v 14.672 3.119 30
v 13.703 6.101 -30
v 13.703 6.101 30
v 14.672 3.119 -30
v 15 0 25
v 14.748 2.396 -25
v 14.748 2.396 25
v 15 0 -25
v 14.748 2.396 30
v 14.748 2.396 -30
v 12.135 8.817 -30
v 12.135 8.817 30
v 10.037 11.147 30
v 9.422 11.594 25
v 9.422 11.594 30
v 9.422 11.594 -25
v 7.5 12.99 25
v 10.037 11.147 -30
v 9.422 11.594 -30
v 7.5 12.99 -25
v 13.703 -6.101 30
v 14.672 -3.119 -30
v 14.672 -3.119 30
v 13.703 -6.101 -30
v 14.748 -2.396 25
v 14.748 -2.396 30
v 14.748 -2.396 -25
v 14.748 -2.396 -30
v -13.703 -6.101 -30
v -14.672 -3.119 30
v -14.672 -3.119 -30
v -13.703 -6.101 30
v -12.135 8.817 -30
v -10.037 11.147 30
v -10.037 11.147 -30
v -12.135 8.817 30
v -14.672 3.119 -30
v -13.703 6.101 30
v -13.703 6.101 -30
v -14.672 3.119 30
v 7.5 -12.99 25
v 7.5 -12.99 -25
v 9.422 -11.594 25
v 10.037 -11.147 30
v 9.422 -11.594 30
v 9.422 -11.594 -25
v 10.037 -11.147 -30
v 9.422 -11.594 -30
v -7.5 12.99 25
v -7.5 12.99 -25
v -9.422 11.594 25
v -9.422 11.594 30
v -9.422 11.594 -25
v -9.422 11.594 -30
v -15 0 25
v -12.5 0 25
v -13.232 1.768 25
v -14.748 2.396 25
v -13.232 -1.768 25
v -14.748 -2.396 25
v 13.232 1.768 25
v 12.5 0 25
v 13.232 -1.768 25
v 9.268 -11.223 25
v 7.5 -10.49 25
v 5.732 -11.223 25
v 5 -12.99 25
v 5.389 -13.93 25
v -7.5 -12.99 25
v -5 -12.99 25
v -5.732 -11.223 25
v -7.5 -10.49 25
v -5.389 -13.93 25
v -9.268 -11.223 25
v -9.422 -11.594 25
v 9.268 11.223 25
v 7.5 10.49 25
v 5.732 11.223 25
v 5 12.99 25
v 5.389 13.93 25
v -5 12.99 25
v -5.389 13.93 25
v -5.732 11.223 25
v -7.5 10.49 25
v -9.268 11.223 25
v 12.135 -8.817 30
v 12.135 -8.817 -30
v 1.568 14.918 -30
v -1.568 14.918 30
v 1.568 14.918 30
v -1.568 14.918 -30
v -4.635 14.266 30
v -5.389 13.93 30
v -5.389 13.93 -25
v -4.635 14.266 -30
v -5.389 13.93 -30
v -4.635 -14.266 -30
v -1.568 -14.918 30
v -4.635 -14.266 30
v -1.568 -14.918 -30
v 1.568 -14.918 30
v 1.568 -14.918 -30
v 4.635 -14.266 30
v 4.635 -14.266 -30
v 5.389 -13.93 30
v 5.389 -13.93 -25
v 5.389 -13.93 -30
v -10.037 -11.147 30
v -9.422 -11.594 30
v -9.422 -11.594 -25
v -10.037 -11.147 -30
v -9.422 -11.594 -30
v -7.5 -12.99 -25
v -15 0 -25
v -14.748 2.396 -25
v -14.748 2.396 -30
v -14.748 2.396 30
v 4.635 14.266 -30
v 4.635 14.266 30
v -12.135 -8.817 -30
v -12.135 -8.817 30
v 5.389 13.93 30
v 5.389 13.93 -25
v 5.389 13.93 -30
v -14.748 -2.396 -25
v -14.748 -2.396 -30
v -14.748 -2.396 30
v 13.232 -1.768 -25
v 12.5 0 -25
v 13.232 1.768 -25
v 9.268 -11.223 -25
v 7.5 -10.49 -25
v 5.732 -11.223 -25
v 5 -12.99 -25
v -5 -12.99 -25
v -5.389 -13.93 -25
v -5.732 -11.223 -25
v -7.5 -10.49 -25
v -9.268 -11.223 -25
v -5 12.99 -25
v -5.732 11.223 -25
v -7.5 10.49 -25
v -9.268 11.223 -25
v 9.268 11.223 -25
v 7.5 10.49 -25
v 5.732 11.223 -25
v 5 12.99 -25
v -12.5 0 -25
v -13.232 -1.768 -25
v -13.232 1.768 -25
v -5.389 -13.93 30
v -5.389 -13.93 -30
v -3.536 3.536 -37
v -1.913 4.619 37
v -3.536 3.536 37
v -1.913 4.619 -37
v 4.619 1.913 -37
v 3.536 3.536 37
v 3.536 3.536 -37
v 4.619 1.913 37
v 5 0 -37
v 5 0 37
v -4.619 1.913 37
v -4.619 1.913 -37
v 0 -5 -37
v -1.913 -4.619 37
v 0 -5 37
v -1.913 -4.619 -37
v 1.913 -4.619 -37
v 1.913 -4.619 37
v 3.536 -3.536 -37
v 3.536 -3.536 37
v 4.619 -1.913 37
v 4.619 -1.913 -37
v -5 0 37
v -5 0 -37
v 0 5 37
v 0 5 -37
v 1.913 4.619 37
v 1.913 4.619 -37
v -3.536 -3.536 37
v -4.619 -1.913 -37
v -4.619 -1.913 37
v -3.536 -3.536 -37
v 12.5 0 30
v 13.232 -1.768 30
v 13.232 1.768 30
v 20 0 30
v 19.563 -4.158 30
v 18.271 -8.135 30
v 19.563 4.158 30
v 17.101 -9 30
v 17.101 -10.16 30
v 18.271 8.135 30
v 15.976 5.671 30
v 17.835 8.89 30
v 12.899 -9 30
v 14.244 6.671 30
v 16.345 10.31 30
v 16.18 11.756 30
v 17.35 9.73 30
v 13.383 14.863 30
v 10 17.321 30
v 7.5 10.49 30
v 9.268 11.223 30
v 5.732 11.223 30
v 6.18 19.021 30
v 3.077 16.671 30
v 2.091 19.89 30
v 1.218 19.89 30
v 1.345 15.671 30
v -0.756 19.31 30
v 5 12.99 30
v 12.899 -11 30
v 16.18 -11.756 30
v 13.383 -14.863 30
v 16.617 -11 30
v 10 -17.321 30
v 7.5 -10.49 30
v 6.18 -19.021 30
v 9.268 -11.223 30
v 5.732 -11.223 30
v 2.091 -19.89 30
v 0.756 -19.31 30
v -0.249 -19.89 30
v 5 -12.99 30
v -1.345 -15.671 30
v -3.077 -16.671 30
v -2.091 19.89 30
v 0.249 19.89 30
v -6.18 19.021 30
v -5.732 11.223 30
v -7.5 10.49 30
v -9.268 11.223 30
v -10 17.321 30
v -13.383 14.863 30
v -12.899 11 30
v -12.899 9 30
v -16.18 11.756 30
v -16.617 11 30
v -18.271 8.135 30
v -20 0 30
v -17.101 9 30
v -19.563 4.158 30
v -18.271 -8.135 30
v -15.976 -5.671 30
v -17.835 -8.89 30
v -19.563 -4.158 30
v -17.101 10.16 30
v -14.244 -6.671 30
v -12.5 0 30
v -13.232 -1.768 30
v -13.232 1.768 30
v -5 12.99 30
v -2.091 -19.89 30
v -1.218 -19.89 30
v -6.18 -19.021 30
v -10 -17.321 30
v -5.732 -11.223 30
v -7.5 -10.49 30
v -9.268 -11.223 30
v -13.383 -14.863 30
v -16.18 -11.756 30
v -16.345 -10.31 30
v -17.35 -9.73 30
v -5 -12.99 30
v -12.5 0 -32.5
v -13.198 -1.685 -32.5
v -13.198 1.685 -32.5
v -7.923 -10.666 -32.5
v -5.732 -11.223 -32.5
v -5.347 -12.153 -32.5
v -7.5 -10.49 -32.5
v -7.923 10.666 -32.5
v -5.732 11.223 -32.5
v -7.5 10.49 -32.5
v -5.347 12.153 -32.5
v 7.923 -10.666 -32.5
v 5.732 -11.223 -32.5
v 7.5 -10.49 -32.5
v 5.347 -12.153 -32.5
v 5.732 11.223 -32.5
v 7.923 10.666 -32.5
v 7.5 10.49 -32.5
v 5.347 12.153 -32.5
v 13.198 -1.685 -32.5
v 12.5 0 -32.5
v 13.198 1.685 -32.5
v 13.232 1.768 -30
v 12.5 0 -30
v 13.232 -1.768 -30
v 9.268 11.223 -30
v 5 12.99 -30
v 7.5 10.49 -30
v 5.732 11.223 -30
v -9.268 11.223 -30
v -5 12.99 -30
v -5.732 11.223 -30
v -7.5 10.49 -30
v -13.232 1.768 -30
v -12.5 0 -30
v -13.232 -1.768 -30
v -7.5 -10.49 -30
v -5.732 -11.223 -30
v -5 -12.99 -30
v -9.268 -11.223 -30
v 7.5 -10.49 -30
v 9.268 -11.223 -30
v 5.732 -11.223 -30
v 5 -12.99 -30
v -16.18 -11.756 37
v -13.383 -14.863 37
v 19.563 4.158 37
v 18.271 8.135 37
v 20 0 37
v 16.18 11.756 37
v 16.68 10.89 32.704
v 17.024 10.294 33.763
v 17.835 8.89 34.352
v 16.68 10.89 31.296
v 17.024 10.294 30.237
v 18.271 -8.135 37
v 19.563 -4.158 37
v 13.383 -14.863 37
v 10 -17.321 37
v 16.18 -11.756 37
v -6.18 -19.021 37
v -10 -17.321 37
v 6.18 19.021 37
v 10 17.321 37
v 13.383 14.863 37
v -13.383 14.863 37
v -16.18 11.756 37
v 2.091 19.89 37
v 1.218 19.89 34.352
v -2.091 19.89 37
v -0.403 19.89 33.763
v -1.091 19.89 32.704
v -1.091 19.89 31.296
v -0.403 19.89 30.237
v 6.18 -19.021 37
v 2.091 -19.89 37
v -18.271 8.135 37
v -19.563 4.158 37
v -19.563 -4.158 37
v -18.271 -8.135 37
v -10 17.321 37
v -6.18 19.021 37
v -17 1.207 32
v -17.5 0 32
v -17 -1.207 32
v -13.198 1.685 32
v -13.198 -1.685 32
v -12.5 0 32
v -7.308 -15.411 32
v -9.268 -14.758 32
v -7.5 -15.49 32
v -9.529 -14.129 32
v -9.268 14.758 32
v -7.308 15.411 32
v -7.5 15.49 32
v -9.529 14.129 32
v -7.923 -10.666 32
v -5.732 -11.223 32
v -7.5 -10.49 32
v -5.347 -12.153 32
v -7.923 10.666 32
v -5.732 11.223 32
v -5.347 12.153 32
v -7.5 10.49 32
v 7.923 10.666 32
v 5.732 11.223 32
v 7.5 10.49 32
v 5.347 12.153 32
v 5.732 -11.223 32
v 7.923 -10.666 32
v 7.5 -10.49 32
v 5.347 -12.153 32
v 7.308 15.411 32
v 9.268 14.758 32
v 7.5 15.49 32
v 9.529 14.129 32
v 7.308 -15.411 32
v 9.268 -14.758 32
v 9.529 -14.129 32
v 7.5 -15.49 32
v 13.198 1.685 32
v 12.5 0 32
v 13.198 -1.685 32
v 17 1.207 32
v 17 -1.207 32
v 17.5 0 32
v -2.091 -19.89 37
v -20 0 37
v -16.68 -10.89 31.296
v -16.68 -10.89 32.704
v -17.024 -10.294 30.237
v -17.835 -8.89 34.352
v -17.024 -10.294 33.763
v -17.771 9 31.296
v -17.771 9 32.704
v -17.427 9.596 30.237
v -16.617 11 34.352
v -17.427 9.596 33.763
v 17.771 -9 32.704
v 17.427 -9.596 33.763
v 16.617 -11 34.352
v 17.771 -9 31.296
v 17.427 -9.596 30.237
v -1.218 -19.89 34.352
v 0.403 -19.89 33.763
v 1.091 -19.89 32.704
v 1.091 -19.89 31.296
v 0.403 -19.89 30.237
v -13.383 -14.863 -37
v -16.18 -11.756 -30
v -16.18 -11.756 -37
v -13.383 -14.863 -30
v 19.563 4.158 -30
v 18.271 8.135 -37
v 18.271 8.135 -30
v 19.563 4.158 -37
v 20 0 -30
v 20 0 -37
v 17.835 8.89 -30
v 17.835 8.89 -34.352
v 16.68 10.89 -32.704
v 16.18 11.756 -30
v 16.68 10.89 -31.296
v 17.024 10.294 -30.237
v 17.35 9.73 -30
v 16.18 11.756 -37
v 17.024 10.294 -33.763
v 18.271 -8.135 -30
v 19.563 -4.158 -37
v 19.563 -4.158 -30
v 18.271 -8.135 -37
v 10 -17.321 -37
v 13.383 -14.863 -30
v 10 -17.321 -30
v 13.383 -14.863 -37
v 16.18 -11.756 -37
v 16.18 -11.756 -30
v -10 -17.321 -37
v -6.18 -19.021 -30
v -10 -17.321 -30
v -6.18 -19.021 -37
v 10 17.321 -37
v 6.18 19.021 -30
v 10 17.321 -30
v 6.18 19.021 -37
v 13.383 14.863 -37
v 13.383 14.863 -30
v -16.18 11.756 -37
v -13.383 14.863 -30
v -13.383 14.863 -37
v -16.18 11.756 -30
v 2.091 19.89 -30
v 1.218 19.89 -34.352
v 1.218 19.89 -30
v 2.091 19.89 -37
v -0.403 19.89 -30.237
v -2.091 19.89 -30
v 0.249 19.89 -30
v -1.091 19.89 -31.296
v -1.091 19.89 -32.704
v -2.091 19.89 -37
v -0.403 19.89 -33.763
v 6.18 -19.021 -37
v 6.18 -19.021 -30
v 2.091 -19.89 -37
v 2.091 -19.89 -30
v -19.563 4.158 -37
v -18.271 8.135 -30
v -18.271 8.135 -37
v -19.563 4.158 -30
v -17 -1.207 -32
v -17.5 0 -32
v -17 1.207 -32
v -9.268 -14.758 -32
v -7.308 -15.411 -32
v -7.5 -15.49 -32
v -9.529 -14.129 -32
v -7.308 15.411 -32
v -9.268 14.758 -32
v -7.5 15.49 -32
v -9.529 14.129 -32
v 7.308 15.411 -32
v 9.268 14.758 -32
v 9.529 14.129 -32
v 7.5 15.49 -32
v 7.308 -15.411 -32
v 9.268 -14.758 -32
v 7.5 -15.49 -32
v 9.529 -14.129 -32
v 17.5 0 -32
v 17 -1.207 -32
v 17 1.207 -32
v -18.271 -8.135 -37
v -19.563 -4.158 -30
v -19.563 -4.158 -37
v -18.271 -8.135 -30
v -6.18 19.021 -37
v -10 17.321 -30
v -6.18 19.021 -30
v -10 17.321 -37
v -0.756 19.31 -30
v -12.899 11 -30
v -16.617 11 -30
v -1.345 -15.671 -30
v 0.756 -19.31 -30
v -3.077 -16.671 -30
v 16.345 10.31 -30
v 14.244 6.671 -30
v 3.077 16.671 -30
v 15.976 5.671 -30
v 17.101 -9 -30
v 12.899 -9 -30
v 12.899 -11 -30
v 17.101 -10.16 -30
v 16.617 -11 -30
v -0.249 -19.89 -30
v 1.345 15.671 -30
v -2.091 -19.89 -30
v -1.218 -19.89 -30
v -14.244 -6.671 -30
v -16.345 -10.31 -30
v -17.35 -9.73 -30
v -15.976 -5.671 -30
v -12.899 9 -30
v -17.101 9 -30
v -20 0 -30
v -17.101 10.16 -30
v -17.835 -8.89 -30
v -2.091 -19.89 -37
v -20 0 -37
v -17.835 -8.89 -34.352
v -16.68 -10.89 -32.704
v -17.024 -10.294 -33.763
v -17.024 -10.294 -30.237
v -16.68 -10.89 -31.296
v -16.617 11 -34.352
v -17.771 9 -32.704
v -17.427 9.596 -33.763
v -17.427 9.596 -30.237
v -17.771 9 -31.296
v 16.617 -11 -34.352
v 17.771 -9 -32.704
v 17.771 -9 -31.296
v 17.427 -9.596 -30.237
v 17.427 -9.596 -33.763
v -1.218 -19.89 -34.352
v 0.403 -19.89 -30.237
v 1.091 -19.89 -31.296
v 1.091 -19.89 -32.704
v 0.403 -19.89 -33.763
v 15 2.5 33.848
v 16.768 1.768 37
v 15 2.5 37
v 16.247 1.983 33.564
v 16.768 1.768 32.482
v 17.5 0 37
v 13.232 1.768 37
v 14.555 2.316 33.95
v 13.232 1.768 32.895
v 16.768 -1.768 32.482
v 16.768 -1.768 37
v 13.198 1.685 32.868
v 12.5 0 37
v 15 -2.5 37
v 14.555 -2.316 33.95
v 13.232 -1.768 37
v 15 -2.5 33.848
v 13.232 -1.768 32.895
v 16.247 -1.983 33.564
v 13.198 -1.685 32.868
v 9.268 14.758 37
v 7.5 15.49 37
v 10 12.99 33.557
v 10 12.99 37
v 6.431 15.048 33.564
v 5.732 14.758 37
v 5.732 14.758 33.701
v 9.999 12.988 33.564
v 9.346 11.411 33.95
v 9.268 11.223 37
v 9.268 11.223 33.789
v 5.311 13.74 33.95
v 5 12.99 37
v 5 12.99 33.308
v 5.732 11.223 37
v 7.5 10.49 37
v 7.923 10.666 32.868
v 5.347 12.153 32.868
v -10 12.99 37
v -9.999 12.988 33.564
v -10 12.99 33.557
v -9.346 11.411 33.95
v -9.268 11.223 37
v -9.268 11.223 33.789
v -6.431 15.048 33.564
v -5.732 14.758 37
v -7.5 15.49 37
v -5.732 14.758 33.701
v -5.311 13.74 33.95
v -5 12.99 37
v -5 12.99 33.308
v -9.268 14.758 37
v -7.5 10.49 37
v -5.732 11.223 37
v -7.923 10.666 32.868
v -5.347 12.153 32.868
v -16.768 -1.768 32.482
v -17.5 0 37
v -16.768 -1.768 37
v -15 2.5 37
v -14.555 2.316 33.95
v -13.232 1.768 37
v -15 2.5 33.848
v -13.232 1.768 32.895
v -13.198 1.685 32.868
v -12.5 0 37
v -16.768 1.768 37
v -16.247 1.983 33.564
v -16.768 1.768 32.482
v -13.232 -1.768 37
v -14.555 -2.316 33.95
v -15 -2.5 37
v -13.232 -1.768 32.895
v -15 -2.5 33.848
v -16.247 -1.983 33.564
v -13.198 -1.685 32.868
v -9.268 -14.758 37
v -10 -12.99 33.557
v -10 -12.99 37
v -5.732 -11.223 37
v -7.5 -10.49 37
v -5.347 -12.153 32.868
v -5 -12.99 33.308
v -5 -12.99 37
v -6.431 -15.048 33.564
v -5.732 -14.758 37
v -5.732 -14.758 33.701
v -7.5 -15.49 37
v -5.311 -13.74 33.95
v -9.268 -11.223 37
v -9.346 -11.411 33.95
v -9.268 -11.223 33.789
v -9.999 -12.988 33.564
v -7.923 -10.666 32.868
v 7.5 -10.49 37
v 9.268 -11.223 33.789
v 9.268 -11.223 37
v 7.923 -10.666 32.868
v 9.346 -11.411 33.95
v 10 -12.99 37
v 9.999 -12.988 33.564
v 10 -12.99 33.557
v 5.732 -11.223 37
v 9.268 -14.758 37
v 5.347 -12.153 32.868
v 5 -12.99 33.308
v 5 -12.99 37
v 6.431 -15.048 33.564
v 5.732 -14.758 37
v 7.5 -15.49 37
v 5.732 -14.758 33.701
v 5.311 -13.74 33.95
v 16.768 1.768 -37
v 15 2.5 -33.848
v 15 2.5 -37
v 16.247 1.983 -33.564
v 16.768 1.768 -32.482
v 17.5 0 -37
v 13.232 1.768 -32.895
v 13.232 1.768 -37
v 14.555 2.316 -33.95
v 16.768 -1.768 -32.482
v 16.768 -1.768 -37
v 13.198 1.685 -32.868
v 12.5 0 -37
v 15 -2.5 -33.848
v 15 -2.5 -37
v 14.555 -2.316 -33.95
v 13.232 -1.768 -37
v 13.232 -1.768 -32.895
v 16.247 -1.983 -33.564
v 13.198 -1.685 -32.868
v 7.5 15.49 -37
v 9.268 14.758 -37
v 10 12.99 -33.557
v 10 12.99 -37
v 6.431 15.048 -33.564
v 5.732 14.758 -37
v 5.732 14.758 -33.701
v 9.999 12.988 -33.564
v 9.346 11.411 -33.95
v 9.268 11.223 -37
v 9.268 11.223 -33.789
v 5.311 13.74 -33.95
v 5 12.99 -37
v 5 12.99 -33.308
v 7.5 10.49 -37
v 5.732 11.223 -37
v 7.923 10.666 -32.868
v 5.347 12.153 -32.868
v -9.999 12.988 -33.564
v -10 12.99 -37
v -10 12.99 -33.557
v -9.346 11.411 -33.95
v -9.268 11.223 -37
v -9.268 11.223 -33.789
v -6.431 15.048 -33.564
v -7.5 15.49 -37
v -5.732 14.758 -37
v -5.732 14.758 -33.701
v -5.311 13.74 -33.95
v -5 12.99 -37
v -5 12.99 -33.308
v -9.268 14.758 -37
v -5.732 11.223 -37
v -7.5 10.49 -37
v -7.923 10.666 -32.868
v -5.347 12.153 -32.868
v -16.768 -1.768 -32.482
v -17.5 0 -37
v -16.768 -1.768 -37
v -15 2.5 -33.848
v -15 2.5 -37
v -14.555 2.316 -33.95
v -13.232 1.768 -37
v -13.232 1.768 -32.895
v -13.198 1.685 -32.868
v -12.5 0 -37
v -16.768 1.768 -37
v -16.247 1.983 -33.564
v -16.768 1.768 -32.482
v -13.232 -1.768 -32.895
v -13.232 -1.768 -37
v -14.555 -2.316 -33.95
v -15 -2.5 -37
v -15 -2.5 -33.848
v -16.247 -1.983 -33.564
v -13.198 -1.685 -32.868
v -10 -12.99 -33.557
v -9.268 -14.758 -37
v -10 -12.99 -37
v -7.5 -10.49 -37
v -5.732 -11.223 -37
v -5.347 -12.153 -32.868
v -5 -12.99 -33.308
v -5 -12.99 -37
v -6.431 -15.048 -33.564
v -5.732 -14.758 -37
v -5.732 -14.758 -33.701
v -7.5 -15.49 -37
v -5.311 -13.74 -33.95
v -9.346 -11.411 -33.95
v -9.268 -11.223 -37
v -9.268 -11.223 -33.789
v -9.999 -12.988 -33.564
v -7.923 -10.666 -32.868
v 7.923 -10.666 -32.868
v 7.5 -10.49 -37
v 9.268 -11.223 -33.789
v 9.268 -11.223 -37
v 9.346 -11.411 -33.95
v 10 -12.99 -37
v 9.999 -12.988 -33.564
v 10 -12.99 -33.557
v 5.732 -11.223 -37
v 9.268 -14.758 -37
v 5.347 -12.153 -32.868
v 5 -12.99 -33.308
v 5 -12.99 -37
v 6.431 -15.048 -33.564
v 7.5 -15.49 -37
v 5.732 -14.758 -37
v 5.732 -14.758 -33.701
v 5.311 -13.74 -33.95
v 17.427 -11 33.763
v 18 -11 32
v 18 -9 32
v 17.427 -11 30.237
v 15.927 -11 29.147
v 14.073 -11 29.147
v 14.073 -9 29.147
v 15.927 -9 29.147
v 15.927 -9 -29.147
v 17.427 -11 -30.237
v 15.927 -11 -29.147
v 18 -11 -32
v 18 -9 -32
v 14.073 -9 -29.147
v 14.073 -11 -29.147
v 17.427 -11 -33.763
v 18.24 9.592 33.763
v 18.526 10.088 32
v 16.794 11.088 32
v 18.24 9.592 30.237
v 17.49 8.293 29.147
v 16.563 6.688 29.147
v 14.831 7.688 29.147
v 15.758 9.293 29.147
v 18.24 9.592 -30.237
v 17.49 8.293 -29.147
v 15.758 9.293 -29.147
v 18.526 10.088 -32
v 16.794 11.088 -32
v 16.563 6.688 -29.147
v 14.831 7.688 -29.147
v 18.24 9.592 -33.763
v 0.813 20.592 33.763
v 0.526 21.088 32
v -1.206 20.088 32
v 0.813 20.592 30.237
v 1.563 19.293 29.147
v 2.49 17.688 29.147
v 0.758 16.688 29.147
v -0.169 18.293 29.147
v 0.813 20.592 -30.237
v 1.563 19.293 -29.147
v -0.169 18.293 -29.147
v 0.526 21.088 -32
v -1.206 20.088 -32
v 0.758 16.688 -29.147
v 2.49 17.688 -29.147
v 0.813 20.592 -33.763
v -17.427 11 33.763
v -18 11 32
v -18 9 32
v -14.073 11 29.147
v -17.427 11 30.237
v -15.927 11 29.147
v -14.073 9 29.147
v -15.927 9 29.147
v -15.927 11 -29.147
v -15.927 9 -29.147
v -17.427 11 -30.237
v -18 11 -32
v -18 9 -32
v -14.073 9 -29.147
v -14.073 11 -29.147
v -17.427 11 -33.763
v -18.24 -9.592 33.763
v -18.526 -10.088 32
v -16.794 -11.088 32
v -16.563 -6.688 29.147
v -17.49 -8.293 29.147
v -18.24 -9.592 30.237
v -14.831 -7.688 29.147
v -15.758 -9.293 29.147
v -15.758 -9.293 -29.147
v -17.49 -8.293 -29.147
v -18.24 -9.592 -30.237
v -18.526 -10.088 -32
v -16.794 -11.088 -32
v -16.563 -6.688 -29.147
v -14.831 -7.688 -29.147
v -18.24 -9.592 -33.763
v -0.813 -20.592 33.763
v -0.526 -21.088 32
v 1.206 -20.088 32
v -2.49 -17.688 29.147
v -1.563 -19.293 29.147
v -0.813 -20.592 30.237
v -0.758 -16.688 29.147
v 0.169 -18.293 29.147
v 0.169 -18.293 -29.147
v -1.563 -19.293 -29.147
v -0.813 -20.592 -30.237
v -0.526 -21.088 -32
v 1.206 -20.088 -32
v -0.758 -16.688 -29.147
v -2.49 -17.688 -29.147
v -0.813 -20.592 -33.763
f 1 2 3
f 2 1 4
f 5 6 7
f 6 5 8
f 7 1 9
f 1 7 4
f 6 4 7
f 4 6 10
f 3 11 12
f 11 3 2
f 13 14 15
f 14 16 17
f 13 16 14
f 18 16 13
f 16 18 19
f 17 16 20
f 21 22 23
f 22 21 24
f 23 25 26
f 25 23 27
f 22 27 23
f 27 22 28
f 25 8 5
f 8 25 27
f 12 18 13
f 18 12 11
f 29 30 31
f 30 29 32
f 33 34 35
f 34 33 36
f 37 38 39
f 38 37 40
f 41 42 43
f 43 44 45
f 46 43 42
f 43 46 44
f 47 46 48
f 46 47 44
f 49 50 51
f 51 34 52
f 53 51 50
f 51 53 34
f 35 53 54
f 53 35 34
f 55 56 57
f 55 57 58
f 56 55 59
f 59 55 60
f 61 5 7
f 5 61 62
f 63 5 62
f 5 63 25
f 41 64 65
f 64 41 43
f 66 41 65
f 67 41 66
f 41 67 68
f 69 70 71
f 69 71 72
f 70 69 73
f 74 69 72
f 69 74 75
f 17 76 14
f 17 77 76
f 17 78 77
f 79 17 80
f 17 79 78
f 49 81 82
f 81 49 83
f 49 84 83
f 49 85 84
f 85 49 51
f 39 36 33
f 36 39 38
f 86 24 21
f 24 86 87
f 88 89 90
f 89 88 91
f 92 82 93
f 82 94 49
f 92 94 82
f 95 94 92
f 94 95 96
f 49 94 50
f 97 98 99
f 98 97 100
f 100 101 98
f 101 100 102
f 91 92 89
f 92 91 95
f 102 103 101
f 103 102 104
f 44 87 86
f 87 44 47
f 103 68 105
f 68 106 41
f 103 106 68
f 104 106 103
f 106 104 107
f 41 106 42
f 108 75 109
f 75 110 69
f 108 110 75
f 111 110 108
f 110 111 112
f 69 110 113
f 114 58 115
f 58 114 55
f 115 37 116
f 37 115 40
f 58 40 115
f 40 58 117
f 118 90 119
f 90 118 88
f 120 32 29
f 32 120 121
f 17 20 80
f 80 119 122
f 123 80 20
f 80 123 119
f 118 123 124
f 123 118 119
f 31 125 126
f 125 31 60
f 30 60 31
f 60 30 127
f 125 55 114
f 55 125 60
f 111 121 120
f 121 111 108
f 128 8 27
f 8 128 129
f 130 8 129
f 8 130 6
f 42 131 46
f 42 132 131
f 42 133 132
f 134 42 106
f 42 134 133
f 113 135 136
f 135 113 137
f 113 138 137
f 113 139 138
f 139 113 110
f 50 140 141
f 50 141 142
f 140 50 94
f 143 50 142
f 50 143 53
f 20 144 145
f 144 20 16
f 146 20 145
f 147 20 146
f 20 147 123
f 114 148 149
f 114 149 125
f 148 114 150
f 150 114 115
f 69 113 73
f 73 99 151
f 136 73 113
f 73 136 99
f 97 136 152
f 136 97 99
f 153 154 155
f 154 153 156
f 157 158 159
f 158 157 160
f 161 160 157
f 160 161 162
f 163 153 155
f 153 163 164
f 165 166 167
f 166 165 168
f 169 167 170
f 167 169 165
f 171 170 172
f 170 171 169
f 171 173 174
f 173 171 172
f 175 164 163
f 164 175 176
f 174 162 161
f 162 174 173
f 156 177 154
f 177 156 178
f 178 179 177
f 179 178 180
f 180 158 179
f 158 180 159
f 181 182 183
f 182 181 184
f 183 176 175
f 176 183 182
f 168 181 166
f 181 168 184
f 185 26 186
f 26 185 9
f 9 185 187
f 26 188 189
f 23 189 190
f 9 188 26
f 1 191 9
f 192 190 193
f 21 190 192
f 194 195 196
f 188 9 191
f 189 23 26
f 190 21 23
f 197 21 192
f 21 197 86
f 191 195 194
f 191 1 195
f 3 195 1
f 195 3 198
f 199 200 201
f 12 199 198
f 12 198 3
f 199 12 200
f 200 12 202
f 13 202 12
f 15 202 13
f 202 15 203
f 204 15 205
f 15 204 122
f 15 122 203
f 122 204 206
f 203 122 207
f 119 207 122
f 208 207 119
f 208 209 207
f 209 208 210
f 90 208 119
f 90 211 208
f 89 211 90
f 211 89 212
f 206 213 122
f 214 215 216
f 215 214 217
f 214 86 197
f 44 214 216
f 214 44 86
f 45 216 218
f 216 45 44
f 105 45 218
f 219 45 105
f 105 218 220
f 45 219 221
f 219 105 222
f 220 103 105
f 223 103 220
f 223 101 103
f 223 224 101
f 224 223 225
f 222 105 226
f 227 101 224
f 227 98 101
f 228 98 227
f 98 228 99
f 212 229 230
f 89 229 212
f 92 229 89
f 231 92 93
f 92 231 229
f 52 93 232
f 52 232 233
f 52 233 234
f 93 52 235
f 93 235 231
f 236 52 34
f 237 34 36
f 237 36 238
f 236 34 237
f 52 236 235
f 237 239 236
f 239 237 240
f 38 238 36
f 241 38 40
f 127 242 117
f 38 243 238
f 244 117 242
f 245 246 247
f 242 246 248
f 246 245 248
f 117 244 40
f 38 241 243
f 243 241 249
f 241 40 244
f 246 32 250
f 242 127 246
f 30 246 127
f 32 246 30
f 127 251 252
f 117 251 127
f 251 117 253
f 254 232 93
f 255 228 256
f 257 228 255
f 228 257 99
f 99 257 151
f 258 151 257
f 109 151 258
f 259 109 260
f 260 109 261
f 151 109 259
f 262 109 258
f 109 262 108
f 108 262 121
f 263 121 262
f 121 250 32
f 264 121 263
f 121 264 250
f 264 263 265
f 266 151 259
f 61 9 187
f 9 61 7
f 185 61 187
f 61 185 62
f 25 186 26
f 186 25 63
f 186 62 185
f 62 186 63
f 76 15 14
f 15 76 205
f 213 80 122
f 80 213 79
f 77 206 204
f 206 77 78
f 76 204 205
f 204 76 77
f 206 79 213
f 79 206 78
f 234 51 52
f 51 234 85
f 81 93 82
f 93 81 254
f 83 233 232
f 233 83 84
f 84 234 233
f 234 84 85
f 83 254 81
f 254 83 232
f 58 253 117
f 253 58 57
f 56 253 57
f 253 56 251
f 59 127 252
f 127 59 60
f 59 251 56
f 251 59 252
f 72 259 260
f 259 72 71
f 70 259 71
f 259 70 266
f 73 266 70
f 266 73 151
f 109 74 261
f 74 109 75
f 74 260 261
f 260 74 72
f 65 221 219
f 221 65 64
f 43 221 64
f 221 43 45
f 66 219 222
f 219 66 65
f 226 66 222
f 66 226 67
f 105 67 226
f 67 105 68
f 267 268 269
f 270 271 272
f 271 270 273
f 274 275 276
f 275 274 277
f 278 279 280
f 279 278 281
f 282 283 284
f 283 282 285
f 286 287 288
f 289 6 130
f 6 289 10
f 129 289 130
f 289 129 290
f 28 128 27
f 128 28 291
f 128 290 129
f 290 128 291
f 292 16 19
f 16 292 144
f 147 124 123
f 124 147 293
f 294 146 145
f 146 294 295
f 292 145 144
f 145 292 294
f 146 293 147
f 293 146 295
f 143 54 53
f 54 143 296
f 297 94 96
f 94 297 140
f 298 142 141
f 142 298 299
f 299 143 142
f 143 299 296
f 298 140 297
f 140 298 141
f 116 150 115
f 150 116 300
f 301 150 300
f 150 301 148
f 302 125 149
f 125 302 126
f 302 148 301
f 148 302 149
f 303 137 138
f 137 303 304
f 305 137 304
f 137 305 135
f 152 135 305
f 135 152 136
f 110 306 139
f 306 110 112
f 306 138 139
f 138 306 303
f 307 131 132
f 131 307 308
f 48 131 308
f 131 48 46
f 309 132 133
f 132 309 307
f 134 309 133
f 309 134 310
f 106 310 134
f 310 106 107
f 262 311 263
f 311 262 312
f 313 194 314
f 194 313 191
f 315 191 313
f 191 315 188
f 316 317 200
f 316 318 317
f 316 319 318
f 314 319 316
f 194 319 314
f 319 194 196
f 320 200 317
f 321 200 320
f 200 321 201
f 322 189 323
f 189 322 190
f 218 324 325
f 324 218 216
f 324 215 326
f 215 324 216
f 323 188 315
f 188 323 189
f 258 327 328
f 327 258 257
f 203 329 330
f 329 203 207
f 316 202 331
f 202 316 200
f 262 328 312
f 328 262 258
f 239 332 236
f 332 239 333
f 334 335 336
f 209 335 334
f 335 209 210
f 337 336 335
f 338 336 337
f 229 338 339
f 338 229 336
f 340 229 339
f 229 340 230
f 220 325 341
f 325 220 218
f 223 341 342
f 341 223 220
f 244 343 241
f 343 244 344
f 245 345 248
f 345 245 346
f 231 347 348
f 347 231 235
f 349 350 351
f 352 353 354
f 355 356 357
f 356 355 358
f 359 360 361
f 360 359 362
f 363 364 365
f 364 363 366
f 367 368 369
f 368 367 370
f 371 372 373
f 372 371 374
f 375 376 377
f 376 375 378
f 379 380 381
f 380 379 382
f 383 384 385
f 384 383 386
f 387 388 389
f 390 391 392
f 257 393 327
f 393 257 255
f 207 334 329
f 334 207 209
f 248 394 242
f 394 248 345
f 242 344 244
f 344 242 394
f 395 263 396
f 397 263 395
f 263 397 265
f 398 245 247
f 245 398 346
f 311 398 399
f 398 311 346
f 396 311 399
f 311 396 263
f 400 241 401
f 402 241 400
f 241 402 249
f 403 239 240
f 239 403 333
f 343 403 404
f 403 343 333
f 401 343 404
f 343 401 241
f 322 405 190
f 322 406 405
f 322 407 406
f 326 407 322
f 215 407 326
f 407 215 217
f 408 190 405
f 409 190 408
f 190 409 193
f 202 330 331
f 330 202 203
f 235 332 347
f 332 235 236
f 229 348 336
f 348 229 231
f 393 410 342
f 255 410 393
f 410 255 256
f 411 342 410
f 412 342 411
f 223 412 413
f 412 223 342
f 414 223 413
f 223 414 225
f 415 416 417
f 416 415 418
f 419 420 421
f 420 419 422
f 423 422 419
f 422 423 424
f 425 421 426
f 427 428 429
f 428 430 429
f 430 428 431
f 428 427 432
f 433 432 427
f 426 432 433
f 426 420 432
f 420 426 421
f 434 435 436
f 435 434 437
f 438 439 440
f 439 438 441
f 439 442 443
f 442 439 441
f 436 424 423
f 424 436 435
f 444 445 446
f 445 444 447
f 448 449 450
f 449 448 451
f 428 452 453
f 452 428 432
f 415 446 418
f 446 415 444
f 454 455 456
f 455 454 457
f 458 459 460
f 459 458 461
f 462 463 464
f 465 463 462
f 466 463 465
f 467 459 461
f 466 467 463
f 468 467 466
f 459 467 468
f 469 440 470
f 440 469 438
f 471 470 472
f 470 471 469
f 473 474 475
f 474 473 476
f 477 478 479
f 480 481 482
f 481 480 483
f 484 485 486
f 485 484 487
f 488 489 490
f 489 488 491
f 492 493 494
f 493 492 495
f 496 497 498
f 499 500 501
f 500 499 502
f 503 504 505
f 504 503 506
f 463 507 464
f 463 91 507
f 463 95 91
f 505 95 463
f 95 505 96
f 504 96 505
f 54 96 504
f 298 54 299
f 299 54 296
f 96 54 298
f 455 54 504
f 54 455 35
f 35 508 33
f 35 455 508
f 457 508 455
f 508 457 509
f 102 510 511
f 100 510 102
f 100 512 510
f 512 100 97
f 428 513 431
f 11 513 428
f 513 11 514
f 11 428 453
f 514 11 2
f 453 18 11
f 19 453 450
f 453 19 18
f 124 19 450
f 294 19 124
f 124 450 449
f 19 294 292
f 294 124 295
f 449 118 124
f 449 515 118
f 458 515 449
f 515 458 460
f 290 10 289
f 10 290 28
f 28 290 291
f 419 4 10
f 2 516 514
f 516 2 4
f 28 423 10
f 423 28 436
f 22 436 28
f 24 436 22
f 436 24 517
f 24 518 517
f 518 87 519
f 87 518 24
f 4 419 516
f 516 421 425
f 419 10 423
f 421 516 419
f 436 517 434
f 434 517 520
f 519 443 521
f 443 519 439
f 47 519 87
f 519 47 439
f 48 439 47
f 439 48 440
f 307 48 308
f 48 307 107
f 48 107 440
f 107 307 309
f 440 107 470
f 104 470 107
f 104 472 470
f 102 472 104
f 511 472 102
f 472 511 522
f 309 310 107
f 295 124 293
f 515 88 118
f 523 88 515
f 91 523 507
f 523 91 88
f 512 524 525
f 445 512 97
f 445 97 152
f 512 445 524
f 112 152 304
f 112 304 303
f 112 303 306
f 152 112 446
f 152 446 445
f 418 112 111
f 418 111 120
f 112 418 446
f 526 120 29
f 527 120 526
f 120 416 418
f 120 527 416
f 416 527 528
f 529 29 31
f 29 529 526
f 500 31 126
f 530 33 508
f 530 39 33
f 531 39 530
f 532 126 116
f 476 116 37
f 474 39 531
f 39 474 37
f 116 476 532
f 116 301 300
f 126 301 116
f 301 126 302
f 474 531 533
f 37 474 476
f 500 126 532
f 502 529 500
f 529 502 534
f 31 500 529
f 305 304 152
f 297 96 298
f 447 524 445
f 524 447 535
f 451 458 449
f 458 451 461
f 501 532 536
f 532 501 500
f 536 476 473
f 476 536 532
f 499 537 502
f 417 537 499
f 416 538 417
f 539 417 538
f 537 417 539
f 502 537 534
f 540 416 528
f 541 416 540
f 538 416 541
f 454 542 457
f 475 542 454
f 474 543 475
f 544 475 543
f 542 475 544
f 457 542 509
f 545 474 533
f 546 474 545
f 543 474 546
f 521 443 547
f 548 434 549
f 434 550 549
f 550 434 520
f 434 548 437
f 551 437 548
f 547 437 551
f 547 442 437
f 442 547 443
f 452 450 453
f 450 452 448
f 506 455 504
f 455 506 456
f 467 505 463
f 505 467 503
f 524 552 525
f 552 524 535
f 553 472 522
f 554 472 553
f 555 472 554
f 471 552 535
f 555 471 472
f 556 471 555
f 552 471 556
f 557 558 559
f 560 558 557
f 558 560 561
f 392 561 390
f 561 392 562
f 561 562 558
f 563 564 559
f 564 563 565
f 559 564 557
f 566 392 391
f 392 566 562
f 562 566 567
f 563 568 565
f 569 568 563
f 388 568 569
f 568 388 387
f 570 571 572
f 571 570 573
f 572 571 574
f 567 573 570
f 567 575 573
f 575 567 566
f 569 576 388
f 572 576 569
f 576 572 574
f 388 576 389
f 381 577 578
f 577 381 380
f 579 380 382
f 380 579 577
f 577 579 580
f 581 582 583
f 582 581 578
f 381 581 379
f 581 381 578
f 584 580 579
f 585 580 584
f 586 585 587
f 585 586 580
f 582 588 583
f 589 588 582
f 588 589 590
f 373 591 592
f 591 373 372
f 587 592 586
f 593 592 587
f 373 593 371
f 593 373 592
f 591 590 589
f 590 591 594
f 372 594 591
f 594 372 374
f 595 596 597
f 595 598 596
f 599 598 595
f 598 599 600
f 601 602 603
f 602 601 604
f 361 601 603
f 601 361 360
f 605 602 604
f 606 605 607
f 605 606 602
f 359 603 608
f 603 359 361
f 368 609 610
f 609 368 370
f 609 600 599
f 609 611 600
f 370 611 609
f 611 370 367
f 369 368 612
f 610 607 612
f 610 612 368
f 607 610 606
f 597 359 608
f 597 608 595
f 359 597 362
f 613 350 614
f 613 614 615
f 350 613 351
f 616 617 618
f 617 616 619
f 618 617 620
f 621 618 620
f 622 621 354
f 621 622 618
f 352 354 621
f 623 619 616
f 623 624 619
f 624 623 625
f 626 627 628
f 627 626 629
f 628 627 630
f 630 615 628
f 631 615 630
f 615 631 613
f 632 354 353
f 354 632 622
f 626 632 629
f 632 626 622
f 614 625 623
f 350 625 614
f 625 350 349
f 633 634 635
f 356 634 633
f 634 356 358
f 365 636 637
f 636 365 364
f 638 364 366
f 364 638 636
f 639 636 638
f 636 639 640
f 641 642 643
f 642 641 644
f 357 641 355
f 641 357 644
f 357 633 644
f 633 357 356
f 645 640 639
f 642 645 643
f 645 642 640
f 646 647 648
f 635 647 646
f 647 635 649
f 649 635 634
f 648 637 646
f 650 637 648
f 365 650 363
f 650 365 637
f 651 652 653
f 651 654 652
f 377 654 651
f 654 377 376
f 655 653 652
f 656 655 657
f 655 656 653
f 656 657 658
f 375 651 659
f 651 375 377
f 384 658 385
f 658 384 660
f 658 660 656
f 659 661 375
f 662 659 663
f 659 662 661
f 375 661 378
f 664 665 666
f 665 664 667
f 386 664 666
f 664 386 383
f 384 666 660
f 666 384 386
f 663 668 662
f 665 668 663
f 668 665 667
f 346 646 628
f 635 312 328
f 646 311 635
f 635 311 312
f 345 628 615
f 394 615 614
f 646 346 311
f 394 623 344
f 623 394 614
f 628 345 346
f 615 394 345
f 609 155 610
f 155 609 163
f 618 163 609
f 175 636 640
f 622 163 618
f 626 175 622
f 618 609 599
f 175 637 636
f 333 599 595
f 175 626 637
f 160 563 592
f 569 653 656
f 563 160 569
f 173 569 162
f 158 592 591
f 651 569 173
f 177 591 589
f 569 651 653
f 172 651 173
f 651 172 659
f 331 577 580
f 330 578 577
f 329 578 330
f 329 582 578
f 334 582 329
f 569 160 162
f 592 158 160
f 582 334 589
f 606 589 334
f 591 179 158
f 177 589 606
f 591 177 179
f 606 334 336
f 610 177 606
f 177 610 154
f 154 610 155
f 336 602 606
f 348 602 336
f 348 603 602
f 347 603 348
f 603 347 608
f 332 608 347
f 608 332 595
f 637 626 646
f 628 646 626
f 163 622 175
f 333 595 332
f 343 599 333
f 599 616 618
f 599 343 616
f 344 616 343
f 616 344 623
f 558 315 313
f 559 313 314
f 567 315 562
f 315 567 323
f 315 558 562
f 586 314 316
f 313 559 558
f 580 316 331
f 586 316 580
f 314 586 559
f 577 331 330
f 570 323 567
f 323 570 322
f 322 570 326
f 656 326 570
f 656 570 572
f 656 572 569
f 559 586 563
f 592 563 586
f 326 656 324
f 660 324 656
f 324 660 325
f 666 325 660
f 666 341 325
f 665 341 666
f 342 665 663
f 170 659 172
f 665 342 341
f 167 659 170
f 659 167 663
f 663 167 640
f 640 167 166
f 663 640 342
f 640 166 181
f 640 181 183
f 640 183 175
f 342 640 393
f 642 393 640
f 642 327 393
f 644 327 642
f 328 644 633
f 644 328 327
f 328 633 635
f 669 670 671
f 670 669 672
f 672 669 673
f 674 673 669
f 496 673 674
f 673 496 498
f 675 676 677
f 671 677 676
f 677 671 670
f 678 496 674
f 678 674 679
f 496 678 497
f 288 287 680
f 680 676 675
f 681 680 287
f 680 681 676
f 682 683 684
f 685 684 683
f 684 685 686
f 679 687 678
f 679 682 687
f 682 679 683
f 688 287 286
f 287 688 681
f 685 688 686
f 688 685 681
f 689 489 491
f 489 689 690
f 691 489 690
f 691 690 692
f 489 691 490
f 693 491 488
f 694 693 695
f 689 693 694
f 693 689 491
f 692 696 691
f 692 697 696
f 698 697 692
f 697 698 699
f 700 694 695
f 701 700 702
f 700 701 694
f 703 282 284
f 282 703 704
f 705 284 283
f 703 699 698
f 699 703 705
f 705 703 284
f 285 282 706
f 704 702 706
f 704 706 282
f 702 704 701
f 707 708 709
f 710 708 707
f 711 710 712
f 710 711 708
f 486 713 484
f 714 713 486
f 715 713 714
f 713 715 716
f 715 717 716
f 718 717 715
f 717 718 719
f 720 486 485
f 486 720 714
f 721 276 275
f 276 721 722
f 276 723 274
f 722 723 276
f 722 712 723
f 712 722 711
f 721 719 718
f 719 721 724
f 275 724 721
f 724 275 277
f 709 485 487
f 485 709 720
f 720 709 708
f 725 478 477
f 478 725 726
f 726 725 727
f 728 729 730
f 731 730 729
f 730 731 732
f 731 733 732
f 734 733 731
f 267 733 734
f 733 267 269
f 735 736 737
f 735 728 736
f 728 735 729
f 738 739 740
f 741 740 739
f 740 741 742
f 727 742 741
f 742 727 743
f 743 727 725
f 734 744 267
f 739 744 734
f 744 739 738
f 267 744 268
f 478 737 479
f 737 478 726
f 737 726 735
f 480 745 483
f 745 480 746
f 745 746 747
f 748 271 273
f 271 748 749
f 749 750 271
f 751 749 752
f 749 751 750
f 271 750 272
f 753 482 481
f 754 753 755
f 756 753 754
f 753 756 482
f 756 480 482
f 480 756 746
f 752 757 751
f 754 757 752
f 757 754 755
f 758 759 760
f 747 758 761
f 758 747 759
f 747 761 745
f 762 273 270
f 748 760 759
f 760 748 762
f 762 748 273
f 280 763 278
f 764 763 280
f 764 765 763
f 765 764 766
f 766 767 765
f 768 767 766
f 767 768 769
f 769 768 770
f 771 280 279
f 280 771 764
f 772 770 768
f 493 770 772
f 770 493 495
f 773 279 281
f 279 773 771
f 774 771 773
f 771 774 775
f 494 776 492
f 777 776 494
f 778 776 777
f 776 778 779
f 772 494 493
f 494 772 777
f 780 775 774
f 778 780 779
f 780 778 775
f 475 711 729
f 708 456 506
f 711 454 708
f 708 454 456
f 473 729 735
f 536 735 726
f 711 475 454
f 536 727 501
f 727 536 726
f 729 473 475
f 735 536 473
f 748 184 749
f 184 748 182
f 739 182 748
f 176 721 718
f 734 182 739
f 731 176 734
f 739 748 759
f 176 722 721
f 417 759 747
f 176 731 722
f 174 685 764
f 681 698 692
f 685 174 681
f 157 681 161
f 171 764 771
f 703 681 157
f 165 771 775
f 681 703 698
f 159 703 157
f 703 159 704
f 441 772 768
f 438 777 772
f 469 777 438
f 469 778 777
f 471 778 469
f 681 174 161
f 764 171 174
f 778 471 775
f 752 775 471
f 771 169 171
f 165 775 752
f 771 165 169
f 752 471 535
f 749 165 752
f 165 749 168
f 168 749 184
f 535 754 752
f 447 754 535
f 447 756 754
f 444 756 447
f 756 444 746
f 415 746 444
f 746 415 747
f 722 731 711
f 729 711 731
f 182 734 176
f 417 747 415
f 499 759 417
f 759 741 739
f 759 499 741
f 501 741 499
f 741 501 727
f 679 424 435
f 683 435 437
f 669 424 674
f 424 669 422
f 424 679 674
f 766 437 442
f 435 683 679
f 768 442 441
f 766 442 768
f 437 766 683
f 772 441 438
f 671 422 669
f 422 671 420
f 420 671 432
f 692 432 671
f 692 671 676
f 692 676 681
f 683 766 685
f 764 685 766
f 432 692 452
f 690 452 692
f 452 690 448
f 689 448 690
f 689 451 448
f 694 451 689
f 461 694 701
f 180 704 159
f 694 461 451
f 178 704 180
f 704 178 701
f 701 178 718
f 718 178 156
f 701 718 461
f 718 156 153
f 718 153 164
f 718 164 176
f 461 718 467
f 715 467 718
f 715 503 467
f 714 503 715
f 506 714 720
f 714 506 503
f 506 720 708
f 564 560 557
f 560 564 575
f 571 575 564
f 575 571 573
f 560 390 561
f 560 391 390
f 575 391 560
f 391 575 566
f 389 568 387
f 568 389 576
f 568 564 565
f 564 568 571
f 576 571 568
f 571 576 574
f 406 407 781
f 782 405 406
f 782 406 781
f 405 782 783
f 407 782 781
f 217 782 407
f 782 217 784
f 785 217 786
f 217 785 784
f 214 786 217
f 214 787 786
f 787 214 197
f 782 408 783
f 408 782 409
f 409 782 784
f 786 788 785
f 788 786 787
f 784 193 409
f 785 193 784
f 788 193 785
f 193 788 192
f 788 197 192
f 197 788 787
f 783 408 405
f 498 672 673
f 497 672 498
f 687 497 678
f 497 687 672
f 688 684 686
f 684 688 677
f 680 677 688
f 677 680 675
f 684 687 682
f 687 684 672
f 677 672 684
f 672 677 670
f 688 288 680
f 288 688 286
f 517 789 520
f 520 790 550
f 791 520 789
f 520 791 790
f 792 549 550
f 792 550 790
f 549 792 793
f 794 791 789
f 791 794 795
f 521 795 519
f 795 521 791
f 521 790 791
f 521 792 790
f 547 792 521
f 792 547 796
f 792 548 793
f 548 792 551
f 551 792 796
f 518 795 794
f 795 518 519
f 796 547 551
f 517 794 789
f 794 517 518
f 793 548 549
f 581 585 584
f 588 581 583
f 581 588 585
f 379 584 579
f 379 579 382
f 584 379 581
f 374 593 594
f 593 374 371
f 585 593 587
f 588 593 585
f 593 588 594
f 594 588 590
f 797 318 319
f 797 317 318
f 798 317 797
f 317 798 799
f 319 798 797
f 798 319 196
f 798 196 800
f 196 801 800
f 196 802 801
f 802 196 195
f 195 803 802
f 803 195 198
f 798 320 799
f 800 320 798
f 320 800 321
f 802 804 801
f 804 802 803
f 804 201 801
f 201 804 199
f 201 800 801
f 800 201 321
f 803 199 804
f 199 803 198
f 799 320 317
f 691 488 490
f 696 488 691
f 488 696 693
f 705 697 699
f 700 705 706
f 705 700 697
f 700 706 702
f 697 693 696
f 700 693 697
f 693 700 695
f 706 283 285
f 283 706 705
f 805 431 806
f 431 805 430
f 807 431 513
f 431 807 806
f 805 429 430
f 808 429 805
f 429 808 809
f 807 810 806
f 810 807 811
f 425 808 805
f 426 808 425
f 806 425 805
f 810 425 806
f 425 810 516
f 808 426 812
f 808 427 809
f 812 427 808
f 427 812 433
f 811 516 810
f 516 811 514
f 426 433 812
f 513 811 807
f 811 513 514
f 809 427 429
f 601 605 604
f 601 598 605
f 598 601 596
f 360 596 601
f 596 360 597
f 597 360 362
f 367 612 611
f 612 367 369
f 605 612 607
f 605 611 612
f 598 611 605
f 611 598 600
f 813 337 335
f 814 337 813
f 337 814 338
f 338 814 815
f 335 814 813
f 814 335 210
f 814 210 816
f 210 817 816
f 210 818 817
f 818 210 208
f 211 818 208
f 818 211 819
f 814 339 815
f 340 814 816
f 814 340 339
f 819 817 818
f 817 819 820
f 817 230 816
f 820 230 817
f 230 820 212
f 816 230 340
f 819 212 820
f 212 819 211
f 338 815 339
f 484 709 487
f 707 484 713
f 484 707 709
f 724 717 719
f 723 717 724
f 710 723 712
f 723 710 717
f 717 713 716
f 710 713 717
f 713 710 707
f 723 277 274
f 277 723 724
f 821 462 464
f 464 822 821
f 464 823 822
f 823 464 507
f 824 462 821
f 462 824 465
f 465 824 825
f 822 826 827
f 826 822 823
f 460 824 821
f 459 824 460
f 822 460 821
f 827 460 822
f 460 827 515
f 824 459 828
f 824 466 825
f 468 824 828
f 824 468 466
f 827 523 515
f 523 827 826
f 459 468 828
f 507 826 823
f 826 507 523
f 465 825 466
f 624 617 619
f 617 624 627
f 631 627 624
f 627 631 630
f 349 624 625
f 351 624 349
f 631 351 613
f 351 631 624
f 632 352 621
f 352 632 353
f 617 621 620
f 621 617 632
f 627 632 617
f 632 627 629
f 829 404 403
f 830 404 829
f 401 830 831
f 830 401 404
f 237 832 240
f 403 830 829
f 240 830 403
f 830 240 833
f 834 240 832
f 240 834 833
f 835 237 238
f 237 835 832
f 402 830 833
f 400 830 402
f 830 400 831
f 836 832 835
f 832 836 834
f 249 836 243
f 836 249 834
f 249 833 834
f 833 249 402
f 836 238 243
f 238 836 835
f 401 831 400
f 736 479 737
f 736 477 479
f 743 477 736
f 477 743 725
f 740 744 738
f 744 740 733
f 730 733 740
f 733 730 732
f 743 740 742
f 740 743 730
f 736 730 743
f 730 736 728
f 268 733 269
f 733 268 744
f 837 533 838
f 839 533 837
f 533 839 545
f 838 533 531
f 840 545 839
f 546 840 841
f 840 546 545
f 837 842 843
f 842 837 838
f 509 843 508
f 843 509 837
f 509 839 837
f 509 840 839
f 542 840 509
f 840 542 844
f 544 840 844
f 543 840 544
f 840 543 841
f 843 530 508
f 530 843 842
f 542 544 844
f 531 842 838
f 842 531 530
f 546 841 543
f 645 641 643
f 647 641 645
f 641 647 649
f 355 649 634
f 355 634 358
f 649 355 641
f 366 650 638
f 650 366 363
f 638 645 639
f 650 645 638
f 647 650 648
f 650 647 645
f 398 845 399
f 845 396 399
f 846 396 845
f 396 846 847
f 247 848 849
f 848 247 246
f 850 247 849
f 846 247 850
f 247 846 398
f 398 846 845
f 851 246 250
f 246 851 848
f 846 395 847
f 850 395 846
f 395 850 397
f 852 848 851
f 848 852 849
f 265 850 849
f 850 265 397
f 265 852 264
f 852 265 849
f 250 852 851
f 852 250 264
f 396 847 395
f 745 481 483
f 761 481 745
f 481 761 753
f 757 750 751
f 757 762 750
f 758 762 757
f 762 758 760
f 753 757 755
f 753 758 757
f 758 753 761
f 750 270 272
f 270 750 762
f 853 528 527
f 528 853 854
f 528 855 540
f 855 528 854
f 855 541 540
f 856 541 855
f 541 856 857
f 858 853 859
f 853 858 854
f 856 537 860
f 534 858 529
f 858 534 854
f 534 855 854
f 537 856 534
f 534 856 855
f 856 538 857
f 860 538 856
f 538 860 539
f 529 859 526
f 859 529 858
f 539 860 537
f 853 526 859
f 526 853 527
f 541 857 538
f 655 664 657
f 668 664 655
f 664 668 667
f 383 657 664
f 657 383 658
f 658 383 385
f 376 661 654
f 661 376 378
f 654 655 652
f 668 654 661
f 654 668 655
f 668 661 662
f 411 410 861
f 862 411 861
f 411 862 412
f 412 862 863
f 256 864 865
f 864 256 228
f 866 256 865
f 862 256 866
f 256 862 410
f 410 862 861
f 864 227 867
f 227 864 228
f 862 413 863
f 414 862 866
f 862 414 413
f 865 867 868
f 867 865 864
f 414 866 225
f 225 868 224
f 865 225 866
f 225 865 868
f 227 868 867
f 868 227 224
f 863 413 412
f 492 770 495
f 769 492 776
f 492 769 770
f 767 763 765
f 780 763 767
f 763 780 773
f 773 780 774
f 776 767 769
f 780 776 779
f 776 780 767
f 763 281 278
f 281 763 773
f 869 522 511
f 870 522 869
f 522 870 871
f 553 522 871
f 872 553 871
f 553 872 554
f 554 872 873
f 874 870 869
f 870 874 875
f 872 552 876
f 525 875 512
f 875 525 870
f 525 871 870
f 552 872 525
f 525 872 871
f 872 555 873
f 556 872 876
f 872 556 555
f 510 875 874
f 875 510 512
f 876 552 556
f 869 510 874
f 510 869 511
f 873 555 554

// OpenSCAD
// Parameters
shaft_diameter = 10;
central_craft_diameter = 30;
central_craft_length = 50;
flange_diameter = 40;
flange_thickness = 5;
spacer_thickness = 2;
bolt_hole_diameter = 5;
bolt_diameter = 4;
bolt_length = 20;
num_bolts = 6; // Adjusted to match the original model
bolt_circle_radius = 15;

// Function to create a flange plate with correct bolt holes
module flange_plate() {
    difference() {
        cylinder(d=flange_diameter, h=flange_thickness, center=true);
        cylinder(d=shaft_diameter, h=flange_thickness + 1, center=true);
        for (i = [0:num_bolts-1]) {
            angle = i * 360 / num_bolts;
            translate([bolt_circle_radius * cos(angle), bolt_circle_radius * sin(angle), 0])
                cylinder(d=bolt_hole_diameter, h=flange_thickness + 1, center=true);
        }
    }
}

// Function to create a spacer ring
module spacer_ring() {
    difference() {
        cylinder(d=flange_diameter, h=spacer_thickness, center=true);
        cylinder(d=shaft_diameter, h=spacer_thickness + 1, center=true);
    }
}

// Function to create a bolt with a nut
module bolt_with_nut() {
    union() {
        cylinder(d=bolt_diameter, h=bolt_length, center=true);
        translate([0, 0, bolt_length / 2])
            cylinder(d=bolt_diameter * 1.5, h=bolt_diameter / 2, center=true);
    }
}

// Function to create the central craft with mounting points
module central_craft() {
    difference() {
        cylinder(d=central_craft_diameter, h=central_craft_length, center=true);
        cylinder(d=shaft_diameter, h=central_craft_length + 1, center=true);
    }
}

// Function to create the input and output crafts with correct bolt holes
module input_output_craft() {
    difference() {
        union() {
            cylinder(d=central_craft_diameter, h=flange_thickness, center=true);
            translate([0, 0, -flange_thickness / 2])
                cylinder(d=central_craft_diameter, h=flange_thickness, center=true);
        }
        cylinder(d=shaft_diameter, h=flange_thickness * 2 + 1, center=true);
        for (i = [0:num_bolts-1]) {
            angle = i * 360 / num_bolts;
            translate([bolt_circle_radius * cos(angle), bolt_circle_radius * sin(angle), 0])
                cylinder(d=bolt_hole_diameter, h=flange_thickness + 1, center=true);
        }
    }
}

// Assembly
module flexible_coupling() {
    central_craft();
    
    translate([0, 0, central_craft_length / 2 + flange_thickness / 2])
        input_output_craft();
    
    translate([0, 0, -central_craft_length / 2 - flange_thickness / 2])
        input_output_craft();
    
    translate([0, 0, central_craft_length / 2 + flange_thickness + spacer_thickness / 2])
        spacer_ring();
    
    translate([0, 0, -central_craft_length / 2 - flange_thickness - spacer_thickness / 2])
        spacer_ring();
    
    translate([0, 0, central_craft_length / 2 + flange_thickness + spacer_thickness + flange_thickness / 2])
        flange_plate();
    
    translate([0, 0, -central_craft_length / 2 - flange_thickness - spacer_thickness - flange_thickness / 2])
        flange_plate();
    
    for (i = [0:num_bolts-1]) {
        angle = i * 360 / num_bolts;
        translate([bolt_circle_radius * cos(angle), bolt_circle_radius * sin(angle), central_craft_length / 2 + flange_thickness + spacer_thickness])
            rotate([90, 0, angle])
                bolt_with_nut();
        
        translate([bolt_circle_radius * cos(angle), bolt_circle_radius * sin(angle), -central_craft_length / 2 - flange_thickness - spacer_thickness])
            rotate([90, 0, angle])
                bolt_with_nut();
    }
}

// Render the model
flexible_coupling();
